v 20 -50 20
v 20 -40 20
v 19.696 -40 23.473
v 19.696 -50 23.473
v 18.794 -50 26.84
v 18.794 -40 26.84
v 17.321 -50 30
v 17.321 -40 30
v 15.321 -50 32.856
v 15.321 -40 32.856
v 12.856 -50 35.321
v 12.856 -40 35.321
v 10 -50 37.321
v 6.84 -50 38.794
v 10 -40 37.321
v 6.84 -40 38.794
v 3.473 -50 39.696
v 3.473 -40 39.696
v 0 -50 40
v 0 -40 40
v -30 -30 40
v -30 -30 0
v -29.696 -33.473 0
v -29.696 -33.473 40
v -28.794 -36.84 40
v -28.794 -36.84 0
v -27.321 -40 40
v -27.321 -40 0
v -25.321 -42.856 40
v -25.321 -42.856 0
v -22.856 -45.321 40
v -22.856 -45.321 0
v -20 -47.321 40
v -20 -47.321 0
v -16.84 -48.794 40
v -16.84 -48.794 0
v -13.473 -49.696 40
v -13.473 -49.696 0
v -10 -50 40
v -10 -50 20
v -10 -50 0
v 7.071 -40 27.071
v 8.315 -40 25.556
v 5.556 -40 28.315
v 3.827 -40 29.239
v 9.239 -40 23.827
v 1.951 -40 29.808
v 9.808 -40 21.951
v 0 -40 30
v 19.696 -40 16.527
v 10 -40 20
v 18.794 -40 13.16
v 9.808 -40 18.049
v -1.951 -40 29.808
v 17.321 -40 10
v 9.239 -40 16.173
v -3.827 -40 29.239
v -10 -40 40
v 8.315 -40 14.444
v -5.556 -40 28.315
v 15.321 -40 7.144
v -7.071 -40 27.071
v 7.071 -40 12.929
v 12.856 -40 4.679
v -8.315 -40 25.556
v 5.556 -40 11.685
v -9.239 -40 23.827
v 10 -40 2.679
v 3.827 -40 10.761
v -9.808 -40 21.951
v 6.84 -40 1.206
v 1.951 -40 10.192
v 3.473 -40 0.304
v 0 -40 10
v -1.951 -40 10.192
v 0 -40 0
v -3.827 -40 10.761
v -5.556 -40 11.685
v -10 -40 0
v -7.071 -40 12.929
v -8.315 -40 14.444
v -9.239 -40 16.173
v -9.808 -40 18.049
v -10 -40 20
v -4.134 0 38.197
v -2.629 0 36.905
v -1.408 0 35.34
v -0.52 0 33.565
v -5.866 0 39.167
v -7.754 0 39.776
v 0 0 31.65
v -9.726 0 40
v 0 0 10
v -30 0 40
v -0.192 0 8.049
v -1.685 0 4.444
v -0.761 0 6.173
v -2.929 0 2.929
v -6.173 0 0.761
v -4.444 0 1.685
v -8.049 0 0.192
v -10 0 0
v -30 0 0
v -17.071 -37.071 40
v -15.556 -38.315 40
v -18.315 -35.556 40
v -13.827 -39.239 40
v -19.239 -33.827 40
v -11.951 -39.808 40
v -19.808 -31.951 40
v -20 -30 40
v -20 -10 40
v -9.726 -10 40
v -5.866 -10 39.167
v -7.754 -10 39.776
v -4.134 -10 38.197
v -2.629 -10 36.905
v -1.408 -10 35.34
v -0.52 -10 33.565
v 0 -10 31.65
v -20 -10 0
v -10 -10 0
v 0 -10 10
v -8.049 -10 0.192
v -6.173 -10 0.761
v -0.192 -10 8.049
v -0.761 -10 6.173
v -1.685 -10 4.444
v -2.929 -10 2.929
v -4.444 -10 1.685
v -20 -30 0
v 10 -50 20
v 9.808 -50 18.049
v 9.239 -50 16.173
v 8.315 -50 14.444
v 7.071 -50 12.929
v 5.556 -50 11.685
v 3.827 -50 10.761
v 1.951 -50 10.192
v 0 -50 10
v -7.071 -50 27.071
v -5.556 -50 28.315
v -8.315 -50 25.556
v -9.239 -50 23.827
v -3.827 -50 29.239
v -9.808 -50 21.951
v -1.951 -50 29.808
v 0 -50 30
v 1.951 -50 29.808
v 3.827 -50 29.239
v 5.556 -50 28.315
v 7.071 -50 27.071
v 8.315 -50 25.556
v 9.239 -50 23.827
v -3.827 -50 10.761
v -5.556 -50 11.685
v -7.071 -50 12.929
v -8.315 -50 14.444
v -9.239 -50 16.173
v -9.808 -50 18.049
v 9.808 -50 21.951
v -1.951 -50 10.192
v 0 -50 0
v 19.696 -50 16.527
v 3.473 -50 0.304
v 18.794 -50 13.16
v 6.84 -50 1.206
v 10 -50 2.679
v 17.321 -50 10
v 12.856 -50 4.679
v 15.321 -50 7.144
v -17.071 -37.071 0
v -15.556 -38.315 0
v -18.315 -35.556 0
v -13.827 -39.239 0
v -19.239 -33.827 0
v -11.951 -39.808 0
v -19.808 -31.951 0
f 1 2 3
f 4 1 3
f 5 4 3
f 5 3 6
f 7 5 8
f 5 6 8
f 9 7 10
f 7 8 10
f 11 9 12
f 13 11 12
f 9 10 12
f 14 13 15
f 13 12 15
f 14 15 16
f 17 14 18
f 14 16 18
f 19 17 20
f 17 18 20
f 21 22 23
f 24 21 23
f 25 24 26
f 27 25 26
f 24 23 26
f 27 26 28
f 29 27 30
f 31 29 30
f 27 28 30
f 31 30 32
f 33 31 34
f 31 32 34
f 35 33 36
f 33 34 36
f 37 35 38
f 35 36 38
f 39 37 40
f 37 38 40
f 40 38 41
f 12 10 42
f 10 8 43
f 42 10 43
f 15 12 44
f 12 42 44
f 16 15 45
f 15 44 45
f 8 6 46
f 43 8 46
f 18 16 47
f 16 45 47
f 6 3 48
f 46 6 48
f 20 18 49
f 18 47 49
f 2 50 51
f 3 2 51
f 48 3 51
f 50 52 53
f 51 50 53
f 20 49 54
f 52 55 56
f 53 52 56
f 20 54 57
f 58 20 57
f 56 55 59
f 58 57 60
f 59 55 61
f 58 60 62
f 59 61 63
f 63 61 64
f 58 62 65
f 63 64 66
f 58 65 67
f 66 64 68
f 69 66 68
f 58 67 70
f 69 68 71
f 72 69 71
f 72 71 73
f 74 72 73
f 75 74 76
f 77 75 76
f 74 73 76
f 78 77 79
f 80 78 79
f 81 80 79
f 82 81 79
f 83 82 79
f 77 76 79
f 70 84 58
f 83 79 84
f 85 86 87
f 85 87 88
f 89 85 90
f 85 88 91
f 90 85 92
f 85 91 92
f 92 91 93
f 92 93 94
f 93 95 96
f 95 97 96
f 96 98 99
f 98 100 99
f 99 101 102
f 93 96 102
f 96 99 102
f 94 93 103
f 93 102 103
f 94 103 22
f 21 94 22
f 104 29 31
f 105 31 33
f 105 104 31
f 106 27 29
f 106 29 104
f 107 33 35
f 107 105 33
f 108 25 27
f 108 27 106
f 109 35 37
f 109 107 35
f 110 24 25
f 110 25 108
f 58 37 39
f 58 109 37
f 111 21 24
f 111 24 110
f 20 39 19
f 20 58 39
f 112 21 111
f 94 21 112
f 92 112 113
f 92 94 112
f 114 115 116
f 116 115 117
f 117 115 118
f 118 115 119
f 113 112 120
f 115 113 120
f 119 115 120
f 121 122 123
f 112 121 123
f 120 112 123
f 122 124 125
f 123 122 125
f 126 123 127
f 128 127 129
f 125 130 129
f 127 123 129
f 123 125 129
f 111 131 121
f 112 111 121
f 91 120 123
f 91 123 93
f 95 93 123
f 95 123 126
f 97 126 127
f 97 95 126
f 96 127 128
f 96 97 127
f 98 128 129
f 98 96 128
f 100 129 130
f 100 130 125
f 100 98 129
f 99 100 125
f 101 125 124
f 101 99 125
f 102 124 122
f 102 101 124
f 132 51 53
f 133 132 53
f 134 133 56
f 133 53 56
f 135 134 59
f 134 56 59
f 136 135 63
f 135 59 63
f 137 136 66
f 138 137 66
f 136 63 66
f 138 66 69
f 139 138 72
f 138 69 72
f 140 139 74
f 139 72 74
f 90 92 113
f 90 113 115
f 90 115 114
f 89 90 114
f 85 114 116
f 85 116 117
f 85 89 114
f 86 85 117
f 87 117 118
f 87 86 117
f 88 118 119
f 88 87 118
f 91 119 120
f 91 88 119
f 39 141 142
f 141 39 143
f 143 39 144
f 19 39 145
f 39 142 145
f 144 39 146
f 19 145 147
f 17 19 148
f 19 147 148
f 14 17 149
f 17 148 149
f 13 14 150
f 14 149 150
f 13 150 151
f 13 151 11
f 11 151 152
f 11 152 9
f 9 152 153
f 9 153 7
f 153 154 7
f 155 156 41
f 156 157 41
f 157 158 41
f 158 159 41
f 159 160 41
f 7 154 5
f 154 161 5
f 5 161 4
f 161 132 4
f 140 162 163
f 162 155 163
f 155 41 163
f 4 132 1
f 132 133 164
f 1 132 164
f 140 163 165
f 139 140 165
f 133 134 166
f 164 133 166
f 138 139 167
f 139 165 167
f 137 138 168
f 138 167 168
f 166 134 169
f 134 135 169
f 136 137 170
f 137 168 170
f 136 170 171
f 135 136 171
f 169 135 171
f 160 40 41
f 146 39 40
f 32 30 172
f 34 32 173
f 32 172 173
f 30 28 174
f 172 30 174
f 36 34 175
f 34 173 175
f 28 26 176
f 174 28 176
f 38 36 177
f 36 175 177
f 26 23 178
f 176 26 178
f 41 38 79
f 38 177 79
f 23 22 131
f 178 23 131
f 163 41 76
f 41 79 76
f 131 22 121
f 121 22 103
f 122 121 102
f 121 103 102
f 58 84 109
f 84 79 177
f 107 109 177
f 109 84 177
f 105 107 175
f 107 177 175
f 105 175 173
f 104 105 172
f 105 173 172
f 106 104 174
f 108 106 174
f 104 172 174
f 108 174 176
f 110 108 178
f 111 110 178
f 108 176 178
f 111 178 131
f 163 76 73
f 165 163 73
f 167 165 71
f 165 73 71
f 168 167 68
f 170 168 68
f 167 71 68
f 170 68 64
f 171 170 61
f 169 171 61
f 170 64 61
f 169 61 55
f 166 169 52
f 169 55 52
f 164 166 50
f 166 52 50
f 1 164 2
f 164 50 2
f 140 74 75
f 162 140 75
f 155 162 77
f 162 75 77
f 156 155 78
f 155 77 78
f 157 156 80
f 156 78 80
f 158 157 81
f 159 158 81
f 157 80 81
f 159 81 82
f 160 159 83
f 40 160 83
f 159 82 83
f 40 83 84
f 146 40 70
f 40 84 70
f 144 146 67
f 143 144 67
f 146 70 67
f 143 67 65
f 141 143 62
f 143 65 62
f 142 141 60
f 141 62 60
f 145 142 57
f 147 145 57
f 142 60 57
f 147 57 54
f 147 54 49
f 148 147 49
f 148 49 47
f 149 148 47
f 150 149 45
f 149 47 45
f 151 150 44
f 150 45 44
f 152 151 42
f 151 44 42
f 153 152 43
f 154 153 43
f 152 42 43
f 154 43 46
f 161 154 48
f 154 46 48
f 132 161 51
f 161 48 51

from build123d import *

# Parameters (mm, degrees)
EXTRUDE_THIN1_DEPTH     = 40
CUT_EXTRUDE_THIN1_DEPTH = 10
CUT_EXTRUDE2_DEPTH      = 10


with BuildPart() as part:
    # Sketch1 → Extrude-Thin1 (new body)
    with BuildSketch(Plane.XY):
        with BuildLine():
            Line((0, 0), (-30, 0))
            Line((-30, 0), (-30, -30))
            ThreePointArc((-30, -30), (-24.142135624, -44.142135624), (-10, -50))
            Line((-10, -50), (20, -50))
            Line((20, -50), (20, -40))
            Line((20, -40), (-10, -40))
            ThreePointArc((-10, -40), (-17.071067812, -37.071067812), (-20, -30))
            Line((-20, -30), (-20, -10))
            Line((-20, -10), (0, -10))
            Line((0, -10), (0, 0))
        make_face()
    extrude(amount=EXTRUDE_THIN1_DEPTH)

    # Sketch3 → Cut-Extrude-Thin1 (cut)
    with BuildSketch(Plane(origin=(0, 0, 0), x_dir=(1, 0, 0), z_dir=(0, 1, 0))):
        with BuildLine():
            ThreePointArc((-10, -40), (-3.453740955, -37.676907189), (0, -31.650138477))
            Line((0, -31.650138477), (9.863069314, -33.299339409))
            ThreePointArc((9.863069314, -33.299339409), (2.955587404, -45.352876834), (-10.136930686, -49.999062455))
            Line((-10.136930686, -49.999062455), (-10, -40))
        make_face()
        with BuildLine():
            ThreePointArc((0, -10), (-2.928932188, -2.928932188), (-10, 0))
            Line((-10, 0), (-10, 10))
            ThreePointArc((-10, 10), (4.142135624, 4.142135624), (10, -10))
            Line((10, -10), (0, -10))
        make_face()
    extrude(amount=-CUT_EXTRUDE_THIN1_DEPTH, mode=Mode.SUBTRACT)

    # Sketch10 → Cut-Extrude2 (cut)
    with BuildSketch(Plane(origin=(0, -40, 0), x_dir=(1, 0, 0), z_dir=(0, 1, 0))):
        with BuildLine():
            ThreePointArc((0, 0), (14.142135624, -5.857864376), (20, -20))
            Line((20, -20), (20, 0))
            Line((20, 0), (0, 0))
        make_face()
        with BuildLine():
            ThreePointArc((20, -20), (14.142135624, -34.142135624), (0, -40))
            Line((0, -40), (20, -40))
            Line((20, -40), (20, -20))
        make_face()
        with BuildLine():
            ThreePointArc((0, -10), (-10, -20), (0, -30))
            Line((0, -30), (0, -10))
        make_face()
        with BuildLine():
            Line((0, -10), (0, -30))
            ThreePointArc((0, -30), (7.071067812, -27.071067812), (10, -20))
            ThreePointArc((10, -20), (7.071067812, -12.928932188), (0, -10))
        make_face()
    extrude(amount=-CUT_EXTRUDE2_DEPTH, mode=Mode.SUBTRACT)


solid = part.part
